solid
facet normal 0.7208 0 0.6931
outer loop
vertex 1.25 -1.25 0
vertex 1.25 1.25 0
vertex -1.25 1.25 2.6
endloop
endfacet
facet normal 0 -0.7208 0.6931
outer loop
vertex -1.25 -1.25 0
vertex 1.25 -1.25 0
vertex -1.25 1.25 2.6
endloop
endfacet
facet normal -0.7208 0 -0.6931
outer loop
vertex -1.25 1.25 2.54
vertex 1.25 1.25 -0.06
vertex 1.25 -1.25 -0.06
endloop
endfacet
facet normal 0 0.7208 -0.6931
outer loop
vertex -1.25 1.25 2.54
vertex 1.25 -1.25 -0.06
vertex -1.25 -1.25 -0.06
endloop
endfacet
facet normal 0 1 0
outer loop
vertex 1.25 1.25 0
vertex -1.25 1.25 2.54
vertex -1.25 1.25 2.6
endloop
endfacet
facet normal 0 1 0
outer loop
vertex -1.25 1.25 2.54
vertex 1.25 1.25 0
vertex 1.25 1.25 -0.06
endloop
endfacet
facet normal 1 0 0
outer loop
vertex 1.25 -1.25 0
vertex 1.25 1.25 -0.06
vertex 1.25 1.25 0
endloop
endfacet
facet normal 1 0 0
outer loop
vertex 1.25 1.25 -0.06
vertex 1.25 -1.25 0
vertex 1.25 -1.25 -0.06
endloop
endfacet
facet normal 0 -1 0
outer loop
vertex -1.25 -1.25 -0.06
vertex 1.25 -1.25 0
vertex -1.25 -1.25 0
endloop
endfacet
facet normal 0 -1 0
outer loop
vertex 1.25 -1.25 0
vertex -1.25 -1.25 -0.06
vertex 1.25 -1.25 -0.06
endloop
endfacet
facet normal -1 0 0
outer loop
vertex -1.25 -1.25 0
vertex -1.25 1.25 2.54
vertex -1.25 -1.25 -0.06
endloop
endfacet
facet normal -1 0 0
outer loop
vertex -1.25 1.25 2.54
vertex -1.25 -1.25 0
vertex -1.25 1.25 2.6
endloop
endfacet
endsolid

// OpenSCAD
// Tent shell kit: roof hip. See lib/lodge_kit.scad.
include <lib/lodge_kit.scad>
kind = "tent";
roof_tile([1, 0, 0, 0], 0);
